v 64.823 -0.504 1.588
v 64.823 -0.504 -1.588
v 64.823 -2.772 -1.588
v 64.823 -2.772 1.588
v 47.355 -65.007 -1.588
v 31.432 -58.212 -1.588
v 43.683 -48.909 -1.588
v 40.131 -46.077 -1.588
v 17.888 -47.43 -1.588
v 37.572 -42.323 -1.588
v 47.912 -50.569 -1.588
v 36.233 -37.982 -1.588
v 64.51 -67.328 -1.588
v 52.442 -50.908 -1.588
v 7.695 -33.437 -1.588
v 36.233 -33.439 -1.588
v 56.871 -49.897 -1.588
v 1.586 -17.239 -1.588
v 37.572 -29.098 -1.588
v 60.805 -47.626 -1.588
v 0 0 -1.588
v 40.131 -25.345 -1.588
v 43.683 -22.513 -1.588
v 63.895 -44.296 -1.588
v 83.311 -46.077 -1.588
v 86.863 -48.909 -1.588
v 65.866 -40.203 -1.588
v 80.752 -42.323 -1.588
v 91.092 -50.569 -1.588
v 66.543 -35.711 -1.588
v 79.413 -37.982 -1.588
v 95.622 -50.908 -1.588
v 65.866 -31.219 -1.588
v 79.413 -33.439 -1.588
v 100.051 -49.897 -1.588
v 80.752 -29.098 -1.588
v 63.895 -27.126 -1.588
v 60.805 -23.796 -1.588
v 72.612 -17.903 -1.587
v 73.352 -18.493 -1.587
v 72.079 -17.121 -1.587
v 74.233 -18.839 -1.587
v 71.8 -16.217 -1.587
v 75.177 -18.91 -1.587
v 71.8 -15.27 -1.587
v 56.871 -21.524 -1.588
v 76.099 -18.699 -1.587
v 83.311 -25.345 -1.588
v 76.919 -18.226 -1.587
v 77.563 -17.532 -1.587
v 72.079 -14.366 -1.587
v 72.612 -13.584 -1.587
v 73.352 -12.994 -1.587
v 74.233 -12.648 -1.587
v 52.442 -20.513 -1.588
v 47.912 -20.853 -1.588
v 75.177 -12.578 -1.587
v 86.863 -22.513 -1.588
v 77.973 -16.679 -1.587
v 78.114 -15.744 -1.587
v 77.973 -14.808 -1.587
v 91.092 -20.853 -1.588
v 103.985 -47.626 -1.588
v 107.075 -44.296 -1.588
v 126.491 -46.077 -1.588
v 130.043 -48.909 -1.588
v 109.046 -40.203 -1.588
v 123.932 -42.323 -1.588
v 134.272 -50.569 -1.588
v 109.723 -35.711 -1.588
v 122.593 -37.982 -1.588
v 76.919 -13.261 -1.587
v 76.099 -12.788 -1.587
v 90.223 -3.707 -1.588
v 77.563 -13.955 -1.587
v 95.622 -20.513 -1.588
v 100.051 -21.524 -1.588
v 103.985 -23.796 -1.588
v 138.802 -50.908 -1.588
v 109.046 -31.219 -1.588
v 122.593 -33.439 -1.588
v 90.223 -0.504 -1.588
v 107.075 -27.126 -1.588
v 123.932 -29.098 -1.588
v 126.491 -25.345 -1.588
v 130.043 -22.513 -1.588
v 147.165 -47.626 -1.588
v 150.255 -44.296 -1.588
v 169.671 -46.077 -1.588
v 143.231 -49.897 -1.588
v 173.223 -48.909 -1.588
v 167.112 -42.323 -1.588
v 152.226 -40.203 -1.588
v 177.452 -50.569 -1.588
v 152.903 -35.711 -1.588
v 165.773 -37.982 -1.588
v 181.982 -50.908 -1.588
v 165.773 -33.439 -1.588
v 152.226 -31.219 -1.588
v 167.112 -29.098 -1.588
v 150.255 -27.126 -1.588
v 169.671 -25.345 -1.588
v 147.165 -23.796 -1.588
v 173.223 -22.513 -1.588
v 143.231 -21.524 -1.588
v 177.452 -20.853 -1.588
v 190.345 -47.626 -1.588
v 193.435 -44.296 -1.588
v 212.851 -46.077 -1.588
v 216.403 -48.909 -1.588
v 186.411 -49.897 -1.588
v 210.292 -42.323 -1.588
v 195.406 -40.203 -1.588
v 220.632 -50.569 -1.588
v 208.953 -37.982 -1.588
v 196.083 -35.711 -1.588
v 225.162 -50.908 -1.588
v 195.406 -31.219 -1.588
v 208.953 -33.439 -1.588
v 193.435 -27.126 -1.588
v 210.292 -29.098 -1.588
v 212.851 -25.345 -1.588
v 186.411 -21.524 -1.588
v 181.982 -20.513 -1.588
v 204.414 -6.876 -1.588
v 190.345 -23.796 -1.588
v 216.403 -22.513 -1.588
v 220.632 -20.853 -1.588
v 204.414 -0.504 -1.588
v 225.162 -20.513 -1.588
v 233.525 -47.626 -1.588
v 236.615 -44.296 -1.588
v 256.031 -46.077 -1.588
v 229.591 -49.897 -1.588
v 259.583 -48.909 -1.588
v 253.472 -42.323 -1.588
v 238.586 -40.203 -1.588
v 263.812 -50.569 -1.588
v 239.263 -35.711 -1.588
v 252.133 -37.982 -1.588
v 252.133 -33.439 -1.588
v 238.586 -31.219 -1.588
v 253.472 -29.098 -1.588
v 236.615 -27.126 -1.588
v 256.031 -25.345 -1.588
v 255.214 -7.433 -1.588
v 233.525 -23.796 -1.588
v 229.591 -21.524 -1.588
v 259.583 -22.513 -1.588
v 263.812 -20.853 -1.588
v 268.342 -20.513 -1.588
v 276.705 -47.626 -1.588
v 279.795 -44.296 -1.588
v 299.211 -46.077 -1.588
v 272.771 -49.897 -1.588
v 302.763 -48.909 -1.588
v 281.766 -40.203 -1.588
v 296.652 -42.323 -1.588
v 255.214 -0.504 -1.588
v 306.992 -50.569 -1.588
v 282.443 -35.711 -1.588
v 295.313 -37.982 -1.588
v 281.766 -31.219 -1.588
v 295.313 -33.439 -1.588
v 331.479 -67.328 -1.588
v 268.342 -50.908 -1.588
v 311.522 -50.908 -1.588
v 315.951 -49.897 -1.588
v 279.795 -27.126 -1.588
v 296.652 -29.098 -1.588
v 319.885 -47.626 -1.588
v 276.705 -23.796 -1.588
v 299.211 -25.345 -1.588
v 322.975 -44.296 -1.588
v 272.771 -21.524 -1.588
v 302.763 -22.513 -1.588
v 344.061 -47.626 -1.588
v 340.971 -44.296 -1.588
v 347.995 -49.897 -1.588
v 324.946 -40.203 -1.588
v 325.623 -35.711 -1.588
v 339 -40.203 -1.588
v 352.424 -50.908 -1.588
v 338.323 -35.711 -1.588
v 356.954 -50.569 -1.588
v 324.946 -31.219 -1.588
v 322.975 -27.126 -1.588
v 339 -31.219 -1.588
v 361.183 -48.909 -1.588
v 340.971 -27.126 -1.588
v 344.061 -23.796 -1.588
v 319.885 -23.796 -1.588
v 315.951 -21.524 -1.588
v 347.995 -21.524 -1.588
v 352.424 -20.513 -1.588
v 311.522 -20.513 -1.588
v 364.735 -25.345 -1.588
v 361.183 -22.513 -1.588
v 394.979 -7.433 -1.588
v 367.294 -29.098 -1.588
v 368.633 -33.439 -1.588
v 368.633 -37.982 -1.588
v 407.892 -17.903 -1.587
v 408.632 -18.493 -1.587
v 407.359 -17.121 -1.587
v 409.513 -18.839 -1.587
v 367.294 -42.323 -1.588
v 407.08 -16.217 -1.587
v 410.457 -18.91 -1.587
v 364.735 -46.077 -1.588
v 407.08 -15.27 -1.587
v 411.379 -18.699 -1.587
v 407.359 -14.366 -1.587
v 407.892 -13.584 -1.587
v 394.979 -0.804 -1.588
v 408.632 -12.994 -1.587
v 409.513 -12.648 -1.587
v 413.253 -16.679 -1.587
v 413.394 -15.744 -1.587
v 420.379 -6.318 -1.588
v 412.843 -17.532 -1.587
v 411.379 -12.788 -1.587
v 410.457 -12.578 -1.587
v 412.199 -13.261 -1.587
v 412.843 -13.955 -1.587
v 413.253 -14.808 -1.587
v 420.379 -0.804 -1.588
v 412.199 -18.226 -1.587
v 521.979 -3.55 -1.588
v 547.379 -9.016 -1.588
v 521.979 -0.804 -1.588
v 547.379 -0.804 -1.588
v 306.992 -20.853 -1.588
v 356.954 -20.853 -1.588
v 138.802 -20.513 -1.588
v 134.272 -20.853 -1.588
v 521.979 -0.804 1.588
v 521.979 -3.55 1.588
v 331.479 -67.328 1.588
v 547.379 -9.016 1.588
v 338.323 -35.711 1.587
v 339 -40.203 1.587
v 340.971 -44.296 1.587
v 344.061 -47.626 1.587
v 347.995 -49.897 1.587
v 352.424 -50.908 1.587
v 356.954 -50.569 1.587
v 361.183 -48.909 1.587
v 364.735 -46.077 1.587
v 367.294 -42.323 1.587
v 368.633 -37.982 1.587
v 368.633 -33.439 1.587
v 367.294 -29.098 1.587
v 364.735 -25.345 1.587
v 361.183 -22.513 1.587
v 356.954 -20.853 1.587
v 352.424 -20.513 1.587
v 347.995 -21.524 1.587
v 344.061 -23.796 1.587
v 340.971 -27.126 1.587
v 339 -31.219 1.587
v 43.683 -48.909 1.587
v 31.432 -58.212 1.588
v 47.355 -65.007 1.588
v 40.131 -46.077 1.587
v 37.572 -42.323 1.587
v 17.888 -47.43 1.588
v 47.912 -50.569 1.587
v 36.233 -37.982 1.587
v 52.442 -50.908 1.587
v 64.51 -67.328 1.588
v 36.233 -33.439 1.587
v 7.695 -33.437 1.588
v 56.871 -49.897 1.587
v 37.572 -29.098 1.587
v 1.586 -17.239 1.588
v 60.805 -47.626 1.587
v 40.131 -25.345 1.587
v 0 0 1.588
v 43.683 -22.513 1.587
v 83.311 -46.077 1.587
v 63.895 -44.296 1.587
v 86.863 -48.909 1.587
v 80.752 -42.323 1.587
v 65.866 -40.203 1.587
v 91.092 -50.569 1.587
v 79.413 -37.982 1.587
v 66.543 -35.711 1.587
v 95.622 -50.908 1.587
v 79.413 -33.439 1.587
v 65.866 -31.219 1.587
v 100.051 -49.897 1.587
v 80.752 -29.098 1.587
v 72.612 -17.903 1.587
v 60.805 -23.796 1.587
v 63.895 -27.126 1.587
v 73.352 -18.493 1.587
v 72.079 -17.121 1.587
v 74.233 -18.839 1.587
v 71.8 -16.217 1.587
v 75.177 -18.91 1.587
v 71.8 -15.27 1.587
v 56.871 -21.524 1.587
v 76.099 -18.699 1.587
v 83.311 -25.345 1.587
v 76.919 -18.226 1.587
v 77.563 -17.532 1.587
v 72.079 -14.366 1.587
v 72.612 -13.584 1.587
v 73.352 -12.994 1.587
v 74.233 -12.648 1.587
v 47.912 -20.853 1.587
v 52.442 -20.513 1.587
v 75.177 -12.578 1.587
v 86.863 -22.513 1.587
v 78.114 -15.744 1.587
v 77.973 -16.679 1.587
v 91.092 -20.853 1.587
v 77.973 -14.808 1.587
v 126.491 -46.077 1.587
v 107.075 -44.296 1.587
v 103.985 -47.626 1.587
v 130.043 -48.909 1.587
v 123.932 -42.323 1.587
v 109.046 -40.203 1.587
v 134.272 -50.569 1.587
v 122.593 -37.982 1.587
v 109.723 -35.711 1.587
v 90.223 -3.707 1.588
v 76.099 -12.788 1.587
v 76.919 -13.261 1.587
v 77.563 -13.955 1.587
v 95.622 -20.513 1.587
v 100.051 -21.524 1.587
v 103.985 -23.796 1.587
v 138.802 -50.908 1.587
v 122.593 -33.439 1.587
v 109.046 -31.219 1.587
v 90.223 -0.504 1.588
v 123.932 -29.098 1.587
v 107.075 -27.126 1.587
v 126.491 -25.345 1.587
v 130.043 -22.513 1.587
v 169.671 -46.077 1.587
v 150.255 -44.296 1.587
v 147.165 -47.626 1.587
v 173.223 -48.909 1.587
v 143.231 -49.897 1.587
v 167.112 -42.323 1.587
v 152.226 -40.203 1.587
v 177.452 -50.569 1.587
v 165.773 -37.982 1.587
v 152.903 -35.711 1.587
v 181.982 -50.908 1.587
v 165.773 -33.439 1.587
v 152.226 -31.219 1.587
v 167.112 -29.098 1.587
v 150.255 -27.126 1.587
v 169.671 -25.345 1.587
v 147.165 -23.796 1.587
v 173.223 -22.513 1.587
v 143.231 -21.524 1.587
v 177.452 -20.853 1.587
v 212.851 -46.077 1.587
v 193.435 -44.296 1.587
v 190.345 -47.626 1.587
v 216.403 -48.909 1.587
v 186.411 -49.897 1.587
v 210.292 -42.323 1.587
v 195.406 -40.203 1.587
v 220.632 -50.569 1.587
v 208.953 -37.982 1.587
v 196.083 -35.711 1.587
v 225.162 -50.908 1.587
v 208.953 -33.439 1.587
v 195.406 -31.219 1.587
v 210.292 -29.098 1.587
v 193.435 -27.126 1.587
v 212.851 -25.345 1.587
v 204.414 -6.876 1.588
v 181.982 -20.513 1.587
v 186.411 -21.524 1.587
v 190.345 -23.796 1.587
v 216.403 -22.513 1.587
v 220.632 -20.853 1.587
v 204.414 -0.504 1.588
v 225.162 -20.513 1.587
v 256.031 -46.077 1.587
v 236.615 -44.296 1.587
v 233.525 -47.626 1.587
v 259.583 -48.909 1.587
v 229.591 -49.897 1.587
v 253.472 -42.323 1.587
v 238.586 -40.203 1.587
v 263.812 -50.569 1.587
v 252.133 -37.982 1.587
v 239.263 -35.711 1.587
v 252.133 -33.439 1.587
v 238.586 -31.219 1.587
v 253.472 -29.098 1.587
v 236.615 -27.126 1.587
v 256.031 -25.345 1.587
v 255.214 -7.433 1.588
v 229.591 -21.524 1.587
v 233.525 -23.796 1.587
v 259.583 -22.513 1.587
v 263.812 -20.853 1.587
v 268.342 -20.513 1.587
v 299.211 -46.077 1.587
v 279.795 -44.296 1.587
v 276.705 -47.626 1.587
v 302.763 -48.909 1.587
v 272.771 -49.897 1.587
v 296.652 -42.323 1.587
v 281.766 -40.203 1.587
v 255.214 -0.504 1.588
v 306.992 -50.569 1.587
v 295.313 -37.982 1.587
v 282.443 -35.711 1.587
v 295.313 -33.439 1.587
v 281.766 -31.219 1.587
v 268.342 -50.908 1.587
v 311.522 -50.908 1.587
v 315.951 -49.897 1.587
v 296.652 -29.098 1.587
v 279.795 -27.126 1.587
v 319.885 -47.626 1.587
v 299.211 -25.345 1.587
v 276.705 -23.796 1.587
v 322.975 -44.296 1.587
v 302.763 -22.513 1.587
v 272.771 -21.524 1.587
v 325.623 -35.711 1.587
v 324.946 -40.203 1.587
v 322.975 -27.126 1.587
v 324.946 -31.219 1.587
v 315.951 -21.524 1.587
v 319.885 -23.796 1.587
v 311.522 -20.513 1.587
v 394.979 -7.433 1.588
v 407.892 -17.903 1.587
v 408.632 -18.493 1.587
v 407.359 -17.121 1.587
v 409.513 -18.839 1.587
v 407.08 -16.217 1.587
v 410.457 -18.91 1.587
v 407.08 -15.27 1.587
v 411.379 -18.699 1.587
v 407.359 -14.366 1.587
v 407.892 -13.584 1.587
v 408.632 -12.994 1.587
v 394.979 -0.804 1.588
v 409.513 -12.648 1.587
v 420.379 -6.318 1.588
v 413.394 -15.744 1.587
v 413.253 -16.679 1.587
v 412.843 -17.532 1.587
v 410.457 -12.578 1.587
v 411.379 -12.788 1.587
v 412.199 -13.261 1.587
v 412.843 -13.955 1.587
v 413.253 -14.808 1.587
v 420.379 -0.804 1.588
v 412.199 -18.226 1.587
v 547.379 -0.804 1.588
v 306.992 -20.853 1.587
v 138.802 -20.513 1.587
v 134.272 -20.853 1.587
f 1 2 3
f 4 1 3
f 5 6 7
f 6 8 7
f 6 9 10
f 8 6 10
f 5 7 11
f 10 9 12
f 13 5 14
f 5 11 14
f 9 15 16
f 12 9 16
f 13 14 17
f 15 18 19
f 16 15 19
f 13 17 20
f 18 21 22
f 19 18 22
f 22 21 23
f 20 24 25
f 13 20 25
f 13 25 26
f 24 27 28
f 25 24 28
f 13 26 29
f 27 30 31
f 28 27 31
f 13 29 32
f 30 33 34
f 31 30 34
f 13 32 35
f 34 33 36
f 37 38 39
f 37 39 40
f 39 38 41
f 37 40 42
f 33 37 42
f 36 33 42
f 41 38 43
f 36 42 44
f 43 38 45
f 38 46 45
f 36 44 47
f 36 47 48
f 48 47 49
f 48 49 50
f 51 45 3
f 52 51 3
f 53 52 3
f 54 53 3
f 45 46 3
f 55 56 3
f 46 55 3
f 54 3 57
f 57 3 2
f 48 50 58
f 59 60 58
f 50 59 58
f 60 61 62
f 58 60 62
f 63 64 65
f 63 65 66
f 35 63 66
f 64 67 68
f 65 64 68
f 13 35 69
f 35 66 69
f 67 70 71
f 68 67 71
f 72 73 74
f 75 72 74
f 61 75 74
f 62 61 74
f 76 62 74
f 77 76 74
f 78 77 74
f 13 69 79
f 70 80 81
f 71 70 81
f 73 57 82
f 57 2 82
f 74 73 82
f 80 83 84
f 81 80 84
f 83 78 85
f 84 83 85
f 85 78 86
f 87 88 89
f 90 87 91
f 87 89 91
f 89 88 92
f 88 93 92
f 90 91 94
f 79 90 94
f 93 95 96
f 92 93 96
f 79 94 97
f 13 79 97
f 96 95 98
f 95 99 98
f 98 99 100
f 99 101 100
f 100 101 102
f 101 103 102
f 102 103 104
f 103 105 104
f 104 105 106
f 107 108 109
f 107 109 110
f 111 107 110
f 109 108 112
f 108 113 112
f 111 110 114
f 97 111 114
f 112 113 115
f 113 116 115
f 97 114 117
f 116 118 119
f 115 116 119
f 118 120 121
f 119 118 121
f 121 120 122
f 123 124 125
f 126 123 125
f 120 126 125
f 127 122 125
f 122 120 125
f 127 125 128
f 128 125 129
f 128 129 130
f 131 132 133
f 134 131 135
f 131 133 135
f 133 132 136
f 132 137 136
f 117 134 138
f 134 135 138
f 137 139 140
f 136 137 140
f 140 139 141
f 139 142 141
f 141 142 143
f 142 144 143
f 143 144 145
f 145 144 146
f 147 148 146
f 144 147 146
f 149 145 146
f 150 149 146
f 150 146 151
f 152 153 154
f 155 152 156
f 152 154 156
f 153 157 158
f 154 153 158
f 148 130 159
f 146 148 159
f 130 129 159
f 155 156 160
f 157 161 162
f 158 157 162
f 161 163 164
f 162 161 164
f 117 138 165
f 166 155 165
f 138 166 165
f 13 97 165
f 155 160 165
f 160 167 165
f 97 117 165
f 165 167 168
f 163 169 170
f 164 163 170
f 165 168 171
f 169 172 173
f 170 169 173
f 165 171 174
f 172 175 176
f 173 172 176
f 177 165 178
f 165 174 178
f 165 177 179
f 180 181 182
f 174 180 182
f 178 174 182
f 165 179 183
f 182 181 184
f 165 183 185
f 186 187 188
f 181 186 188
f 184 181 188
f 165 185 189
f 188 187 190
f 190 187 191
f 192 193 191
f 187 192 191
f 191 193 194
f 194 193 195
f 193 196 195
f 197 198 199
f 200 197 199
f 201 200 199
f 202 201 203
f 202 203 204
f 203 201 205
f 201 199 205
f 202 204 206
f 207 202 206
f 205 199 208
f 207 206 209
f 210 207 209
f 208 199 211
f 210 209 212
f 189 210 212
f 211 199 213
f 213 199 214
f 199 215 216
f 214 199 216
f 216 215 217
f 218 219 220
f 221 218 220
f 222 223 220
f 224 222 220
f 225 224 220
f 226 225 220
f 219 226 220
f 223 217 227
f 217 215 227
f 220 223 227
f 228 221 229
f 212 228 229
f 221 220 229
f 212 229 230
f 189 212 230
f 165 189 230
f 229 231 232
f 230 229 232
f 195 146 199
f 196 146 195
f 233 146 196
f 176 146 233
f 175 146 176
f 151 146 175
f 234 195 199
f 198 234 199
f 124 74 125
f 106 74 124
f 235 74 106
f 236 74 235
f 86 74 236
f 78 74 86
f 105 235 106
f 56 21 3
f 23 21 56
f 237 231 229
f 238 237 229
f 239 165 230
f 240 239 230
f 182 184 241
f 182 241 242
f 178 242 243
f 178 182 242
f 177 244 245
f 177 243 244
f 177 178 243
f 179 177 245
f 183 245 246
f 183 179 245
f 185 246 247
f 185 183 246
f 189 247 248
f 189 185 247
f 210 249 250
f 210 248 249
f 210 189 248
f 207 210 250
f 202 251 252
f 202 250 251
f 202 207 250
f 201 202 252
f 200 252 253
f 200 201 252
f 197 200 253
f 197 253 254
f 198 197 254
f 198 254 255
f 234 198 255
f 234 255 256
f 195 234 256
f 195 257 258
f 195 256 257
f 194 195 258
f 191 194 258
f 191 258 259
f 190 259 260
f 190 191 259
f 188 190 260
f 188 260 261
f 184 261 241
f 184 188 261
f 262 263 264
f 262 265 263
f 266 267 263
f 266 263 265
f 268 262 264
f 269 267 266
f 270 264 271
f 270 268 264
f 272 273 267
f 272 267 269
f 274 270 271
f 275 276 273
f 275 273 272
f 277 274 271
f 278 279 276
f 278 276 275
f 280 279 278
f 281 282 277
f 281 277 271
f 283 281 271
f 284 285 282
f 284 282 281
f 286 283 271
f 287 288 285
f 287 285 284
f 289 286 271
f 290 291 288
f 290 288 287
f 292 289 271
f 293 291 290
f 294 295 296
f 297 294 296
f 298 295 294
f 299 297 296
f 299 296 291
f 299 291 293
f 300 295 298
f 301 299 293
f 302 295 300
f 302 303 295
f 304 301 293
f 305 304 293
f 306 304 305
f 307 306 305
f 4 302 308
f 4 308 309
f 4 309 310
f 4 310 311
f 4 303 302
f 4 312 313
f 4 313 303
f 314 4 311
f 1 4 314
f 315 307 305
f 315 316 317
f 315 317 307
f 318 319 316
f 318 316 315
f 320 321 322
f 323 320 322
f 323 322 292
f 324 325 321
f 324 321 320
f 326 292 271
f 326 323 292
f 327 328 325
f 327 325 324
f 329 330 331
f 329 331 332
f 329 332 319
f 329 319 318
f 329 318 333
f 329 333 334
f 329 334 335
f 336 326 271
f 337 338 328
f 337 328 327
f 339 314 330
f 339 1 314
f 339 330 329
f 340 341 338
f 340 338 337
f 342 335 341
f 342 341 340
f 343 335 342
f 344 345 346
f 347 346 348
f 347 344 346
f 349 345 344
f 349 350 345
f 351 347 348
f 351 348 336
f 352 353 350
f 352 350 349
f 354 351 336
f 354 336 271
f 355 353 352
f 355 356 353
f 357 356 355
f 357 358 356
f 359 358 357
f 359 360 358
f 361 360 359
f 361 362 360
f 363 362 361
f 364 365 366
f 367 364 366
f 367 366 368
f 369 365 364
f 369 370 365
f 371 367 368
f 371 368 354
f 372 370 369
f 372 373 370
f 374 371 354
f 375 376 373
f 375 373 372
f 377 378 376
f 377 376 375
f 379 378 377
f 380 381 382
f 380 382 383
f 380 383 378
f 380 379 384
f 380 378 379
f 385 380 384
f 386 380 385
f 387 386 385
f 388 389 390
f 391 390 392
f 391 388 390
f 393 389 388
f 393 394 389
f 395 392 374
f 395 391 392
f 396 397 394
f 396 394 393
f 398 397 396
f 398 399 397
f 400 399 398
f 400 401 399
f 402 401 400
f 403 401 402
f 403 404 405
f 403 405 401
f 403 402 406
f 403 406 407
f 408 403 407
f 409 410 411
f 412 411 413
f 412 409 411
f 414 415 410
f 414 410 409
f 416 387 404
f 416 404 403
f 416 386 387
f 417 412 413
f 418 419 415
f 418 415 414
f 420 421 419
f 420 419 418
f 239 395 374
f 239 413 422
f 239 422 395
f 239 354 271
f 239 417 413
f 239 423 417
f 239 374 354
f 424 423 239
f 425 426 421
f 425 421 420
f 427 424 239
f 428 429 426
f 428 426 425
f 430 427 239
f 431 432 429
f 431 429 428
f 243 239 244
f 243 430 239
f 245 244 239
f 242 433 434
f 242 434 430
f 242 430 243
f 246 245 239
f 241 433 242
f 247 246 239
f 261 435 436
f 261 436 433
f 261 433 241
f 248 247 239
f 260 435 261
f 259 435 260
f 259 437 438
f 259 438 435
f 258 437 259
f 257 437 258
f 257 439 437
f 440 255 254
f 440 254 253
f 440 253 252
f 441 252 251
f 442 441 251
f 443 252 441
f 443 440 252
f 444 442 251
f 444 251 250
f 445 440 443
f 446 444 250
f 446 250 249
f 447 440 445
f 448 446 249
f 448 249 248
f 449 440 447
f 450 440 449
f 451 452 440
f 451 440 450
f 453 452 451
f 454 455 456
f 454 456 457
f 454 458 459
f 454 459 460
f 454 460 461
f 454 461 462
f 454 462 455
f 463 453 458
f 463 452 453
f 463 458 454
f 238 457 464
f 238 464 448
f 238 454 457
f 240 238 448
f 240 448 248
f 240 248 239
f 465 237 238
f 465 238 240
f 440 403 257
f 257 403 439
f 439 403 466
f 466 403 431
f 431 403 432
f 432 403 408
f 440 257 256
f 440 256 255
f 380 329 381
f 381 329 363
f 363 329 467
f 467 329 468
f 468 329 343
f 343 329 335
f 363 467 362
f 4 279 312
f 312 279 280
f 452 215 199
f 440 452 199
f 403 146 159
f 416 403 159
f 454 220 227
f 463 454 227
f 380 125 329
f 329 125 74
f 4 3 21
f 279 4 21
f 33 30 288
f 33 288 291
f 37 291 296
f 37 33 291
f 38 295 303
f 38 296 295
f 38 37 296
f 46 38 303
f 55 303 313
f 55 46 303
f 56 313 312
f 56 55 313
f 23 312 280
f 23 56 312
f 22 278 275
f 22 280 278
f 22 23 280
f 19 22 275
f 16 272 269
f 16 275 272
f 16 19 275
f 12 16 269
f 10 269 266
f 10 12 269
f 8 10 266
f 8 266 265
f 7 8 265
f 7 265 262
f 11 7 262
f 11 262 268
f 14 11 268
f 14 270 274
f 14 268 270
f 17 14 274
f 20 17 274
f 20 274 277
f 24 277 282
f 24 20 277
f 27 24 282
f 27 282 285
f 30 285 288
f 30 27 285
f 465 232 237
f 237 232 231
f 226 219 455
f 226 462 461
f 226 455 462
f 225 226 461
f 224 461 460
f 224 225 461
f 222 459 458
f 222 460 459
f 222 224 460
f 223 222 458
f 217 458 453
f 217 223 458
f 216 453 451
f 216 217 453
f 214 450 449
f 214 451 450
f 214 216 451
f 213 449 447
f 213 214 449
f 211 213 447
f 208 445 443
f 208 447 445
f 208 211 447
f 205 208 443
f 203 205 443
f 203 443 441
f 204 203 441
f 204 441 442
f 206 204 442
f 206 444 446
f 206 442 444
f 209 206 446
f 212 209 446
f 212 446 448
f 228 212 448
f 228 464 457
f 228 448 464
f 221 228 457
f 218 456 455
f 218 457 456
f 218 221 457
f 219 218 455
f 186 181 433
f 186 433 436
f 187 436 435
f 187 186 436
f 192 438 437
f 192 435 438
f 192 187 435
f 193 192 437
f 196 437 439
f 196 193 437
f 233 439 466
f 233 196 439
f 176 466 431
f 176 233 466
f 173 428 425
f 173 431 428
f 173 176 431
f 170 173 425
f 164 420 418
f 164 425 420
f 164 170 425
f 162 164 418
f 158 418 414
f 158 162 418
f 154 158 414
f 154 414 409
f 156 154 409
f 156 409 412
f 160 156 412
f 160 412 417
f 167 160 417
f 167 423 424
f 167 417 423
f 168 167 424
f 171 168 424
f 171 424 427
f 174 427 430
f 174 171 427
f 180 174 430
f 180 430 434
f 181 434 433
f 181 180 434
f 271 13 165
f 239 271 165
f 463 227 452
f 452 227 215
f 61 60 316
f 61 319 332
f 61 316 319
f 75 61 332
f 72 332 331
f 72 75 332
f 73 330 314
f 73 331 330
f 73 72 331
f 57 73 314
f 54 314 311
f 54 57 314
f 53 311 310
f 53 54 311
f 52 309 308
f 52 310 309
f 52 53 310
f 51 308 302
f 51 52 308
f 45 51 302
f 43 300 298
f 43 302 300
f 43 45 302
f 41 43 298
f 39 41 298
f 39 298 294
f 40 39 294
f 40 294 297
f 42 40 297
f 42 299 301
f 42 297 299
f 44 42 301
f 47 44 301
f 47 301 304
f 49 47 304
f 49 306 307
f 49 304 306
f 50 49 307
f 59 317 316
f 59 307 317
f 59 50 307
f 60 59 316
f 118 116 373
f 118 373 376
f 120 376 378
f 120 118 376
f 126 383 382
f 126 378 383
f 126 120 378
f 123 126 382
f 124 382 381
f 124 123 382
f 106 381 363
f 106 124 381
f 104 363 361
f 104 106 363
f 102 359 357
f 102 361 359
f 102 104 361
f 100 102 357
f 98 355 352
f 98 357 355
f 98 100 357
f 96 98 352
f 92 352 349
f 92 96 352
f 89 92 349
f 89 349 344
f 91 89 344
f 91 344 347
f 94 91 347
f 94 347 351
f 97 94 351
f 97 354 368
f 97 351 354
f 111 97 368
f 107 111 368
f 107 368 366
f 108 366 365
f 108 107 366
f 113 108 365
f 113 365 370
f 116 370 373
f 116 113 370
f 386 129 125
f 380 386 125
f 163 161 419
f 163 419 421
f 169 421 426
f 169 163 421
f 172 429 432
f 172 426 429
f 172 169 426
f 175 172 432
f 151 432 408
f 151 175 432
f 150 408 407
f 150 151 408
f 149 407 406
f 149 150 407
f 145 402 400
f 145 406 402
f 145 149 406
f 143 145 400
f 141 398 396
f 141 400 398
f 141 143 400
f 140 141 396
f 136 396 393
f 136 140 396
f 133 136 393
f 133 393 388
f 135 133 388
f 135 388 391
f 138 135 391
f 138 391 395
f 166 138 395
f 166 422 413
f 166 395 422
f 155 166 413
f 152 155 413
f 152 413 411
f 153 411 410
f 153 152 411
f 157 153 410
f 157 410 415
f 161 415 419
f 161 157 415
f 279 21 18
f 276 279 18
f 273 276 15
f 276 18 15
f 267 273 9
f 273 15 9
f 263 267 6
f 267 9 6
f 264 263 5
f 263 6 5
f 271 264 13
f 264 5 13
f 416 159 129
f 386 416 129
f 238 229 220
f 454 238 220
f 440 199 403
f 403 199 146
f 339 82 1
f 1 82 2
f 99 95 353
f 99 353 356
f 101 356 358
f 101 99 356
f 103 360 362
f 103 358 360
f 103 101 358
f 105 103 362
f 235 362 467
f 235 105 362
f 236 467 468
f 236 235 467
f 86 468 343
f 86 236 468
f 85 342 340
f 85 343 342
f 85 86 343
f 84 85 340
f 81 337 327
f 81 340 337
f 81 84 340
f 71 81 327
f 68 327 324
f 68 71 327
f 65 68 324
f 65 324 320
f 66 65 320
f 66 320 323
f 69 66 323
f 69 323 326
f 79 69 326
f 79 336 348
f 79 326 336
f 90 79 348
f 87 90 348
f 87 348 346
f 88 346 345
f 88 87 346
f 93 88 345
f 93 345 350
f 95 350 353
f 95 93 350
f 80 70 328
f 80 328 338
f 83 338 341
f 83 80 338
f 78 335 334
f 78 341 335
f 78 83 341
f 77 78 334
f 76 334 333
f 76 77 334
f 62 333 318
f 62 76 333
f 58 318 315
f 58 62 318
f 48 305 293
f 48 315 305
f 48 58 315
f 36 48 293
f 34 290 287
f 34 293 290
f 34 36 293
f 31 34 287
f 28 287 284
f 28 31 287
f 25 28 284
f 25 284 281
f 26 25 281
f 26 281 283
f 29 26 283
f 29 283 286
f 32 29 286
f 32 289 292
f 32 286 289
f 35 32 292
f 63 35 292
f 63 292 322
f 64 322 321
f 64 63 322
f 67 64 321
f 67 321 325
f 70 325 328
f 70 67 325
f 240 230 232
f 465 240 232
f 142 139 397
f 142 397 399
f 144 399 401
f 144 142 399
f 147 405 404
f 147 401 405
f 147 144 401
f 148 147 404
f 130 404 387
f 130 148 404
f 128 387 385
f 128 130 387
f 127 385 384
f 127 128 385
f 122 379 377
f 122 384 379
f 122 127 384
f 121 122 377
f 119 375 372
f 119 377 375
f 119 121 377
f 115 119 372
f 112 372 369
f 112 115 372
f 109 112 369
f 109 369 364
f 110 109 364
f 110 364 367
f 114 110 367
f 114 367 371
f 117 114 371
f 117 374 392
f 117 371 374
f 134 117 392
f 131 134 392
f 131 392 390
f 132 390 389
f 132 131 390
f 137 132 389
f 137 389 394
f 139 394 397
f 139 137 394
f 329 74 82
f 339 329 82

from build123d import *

# Parameters (mm, degrees)
BOSS_EXTRUDE1_DEPTH      = 1.5875
BOSS_EXTRUDE1_DEPTH_BACK = 1.5875
CUT_EXTRUDE1_DEPTH       = 552.50665189
CUT_EXTRUDE1_DEPTH_BACK  = 552.50665189
SKETCH2_R                = 3.175
CUT_EXTRUDE2_DEPTH       = 2.54
CUT_EXTRUDE2_DEPTH_BACK  = 2.54
SKETCH3_R                = 15.24


with BuildPart() as part:
    # Sketch1 → Boss-Extrude1 (new, two sides: drawn at the far end of the back side and taken through both)
    with BuildSketch(Plane.XY.offset(-BOSS_EXTRUDE1_DEPTH_BACK)):
        with BuildLine():
            Line((331.479240226, -67.327812174), (547.379240226, -9.015530032))
            Line((547.379240226, -9.015530032), (547.379240226, -0.80358759))
            Line((547.379240226, -0.80358759), (521.979240226, -0.80358759))
            Line((521.979240226, -0.80358759), (521.979240226, -3.550327588))
            Line((521.979240226, -3.550327588), (420.379240226, -6.318039604))
            Line((420.379240226, -6.318039604), (420.379240226, -0.80358759))
            Line((420.379240226, -0.80358759), (394.979240226, -0.80358759))
            Line((394.979240226, -0.80358759), (394.979240226, -7.4329025))
            Line((394.979240226, -7.4329025), (255.21408059, -7.4329025))
            Line((255.21408059, -7.4329025), (255.21408059, -0.503629592))
            Line((255.21408059, -0.503629592), (204.41408059, -0.503629592))
            Line((204.41408059, -0.503629592), (204.41408059, -6.875812174))
            Line((204.41408059, -6.875812174), (90.223191735, -3.707270632))
            Line((90.223191735, -3.707270632), (90.223191735, -0.503629592))
            Line((90.223191735, -0.503629592), (64.823191735, -0.503629592))
            Line((64.823191735, -0.503629592), (64.823191735, -2.772070572))
            Line((64.823191735, -2.772070572), (0, 0))
            ThreePointArc((0, 0), (17.887759649, -47.42996384), (64.510168925, -67.327812174))
            Line((64.510168925, -67.327812174), (331.479240226, -67.327812174))
        make_face()
    extrude(amount=BOSS_EXTRUDE1_DEPTH + BOSS_EXTRUDE1_DEPTH_BACK)

    # Sketch2 → Cut-Extrude1 (cut, two sides: drawn at the far end of the back side and taken through both)
    with BuildSketch(Plane.XY.offset(-CUT_EXTRUDE1_DEPTH_BACK)):
        with Locations((410.219240226, -15.743629592)):
            Circle(SKETCH2_R)
        with Locations((74.939240226, -15.743629592)):
            Circle(SKETCH2_R)
    extrude(amount=CUT_EXTRUDE1_DEPTH + CUT_EXTRUDE1_DEPTH_BACK, mode=Mode.SUBTRACT)

    # Sketch3 → Cut-Extrude2 (cut, two sides: drawn at the far end of the back side and taken through both)
    with BuildSketch(Plane.XY.offset(-CUT_EXTRUDE2_DEPTH_BACK)):
        with BuildLine():
            ThreePointArc((79.242840924, -35.710884581), (94.482840924, -50.950884581), (109.722840924, -35.710884581))
            Line((109.722840924, -35.710884581), (79.242840924, -35.710884581))
        make_face()
        with BuildLine():
            Line((79.242840924, -35.710884581), (109.722840924, -35.710884581))
            ThreePointArc((109.722840924, -35.710884581), (94.482840924, -20.470884581), (79.242840924, -35.710884581))
        make_face()
        with BuildLine():
            ThreePointArc((368.802840924, -35.710884581), (353.562840924, -20.470884581), (338.322840924, -35.710884581))
            ThreePointArc((338.322840924, -35.710884581), (353.562840924, -50.950884581), (368.802840924, -35.710884581))
        make_face()
        with Locations((51.302840924, -35.710884581)):
            Circle(SKETCH3_R)
        with Locations((137.662840924, -35.710884581)):
            Circle(SKETCH3_R)
        with Locations((180.842840924, -35.710884581)):
            Circle(SKETCH3_R)
        with Locations((224.022840924, -35.710884581)):
            Circle(SKETCH3_R)
        with Locations((267.202840924, -35.710884581)):
            Circle(SKETCH3_R)
        with Locations((310.382840924, -35.710884581)):
            Circle(SKETCH3_R)
    extrude(amount=CUT_EXTRUDE2_DEPTH + CUT_EXTRUDE2_DEPTH_BACK, mode=Mode.SUBTRACT)


solid = part.part
